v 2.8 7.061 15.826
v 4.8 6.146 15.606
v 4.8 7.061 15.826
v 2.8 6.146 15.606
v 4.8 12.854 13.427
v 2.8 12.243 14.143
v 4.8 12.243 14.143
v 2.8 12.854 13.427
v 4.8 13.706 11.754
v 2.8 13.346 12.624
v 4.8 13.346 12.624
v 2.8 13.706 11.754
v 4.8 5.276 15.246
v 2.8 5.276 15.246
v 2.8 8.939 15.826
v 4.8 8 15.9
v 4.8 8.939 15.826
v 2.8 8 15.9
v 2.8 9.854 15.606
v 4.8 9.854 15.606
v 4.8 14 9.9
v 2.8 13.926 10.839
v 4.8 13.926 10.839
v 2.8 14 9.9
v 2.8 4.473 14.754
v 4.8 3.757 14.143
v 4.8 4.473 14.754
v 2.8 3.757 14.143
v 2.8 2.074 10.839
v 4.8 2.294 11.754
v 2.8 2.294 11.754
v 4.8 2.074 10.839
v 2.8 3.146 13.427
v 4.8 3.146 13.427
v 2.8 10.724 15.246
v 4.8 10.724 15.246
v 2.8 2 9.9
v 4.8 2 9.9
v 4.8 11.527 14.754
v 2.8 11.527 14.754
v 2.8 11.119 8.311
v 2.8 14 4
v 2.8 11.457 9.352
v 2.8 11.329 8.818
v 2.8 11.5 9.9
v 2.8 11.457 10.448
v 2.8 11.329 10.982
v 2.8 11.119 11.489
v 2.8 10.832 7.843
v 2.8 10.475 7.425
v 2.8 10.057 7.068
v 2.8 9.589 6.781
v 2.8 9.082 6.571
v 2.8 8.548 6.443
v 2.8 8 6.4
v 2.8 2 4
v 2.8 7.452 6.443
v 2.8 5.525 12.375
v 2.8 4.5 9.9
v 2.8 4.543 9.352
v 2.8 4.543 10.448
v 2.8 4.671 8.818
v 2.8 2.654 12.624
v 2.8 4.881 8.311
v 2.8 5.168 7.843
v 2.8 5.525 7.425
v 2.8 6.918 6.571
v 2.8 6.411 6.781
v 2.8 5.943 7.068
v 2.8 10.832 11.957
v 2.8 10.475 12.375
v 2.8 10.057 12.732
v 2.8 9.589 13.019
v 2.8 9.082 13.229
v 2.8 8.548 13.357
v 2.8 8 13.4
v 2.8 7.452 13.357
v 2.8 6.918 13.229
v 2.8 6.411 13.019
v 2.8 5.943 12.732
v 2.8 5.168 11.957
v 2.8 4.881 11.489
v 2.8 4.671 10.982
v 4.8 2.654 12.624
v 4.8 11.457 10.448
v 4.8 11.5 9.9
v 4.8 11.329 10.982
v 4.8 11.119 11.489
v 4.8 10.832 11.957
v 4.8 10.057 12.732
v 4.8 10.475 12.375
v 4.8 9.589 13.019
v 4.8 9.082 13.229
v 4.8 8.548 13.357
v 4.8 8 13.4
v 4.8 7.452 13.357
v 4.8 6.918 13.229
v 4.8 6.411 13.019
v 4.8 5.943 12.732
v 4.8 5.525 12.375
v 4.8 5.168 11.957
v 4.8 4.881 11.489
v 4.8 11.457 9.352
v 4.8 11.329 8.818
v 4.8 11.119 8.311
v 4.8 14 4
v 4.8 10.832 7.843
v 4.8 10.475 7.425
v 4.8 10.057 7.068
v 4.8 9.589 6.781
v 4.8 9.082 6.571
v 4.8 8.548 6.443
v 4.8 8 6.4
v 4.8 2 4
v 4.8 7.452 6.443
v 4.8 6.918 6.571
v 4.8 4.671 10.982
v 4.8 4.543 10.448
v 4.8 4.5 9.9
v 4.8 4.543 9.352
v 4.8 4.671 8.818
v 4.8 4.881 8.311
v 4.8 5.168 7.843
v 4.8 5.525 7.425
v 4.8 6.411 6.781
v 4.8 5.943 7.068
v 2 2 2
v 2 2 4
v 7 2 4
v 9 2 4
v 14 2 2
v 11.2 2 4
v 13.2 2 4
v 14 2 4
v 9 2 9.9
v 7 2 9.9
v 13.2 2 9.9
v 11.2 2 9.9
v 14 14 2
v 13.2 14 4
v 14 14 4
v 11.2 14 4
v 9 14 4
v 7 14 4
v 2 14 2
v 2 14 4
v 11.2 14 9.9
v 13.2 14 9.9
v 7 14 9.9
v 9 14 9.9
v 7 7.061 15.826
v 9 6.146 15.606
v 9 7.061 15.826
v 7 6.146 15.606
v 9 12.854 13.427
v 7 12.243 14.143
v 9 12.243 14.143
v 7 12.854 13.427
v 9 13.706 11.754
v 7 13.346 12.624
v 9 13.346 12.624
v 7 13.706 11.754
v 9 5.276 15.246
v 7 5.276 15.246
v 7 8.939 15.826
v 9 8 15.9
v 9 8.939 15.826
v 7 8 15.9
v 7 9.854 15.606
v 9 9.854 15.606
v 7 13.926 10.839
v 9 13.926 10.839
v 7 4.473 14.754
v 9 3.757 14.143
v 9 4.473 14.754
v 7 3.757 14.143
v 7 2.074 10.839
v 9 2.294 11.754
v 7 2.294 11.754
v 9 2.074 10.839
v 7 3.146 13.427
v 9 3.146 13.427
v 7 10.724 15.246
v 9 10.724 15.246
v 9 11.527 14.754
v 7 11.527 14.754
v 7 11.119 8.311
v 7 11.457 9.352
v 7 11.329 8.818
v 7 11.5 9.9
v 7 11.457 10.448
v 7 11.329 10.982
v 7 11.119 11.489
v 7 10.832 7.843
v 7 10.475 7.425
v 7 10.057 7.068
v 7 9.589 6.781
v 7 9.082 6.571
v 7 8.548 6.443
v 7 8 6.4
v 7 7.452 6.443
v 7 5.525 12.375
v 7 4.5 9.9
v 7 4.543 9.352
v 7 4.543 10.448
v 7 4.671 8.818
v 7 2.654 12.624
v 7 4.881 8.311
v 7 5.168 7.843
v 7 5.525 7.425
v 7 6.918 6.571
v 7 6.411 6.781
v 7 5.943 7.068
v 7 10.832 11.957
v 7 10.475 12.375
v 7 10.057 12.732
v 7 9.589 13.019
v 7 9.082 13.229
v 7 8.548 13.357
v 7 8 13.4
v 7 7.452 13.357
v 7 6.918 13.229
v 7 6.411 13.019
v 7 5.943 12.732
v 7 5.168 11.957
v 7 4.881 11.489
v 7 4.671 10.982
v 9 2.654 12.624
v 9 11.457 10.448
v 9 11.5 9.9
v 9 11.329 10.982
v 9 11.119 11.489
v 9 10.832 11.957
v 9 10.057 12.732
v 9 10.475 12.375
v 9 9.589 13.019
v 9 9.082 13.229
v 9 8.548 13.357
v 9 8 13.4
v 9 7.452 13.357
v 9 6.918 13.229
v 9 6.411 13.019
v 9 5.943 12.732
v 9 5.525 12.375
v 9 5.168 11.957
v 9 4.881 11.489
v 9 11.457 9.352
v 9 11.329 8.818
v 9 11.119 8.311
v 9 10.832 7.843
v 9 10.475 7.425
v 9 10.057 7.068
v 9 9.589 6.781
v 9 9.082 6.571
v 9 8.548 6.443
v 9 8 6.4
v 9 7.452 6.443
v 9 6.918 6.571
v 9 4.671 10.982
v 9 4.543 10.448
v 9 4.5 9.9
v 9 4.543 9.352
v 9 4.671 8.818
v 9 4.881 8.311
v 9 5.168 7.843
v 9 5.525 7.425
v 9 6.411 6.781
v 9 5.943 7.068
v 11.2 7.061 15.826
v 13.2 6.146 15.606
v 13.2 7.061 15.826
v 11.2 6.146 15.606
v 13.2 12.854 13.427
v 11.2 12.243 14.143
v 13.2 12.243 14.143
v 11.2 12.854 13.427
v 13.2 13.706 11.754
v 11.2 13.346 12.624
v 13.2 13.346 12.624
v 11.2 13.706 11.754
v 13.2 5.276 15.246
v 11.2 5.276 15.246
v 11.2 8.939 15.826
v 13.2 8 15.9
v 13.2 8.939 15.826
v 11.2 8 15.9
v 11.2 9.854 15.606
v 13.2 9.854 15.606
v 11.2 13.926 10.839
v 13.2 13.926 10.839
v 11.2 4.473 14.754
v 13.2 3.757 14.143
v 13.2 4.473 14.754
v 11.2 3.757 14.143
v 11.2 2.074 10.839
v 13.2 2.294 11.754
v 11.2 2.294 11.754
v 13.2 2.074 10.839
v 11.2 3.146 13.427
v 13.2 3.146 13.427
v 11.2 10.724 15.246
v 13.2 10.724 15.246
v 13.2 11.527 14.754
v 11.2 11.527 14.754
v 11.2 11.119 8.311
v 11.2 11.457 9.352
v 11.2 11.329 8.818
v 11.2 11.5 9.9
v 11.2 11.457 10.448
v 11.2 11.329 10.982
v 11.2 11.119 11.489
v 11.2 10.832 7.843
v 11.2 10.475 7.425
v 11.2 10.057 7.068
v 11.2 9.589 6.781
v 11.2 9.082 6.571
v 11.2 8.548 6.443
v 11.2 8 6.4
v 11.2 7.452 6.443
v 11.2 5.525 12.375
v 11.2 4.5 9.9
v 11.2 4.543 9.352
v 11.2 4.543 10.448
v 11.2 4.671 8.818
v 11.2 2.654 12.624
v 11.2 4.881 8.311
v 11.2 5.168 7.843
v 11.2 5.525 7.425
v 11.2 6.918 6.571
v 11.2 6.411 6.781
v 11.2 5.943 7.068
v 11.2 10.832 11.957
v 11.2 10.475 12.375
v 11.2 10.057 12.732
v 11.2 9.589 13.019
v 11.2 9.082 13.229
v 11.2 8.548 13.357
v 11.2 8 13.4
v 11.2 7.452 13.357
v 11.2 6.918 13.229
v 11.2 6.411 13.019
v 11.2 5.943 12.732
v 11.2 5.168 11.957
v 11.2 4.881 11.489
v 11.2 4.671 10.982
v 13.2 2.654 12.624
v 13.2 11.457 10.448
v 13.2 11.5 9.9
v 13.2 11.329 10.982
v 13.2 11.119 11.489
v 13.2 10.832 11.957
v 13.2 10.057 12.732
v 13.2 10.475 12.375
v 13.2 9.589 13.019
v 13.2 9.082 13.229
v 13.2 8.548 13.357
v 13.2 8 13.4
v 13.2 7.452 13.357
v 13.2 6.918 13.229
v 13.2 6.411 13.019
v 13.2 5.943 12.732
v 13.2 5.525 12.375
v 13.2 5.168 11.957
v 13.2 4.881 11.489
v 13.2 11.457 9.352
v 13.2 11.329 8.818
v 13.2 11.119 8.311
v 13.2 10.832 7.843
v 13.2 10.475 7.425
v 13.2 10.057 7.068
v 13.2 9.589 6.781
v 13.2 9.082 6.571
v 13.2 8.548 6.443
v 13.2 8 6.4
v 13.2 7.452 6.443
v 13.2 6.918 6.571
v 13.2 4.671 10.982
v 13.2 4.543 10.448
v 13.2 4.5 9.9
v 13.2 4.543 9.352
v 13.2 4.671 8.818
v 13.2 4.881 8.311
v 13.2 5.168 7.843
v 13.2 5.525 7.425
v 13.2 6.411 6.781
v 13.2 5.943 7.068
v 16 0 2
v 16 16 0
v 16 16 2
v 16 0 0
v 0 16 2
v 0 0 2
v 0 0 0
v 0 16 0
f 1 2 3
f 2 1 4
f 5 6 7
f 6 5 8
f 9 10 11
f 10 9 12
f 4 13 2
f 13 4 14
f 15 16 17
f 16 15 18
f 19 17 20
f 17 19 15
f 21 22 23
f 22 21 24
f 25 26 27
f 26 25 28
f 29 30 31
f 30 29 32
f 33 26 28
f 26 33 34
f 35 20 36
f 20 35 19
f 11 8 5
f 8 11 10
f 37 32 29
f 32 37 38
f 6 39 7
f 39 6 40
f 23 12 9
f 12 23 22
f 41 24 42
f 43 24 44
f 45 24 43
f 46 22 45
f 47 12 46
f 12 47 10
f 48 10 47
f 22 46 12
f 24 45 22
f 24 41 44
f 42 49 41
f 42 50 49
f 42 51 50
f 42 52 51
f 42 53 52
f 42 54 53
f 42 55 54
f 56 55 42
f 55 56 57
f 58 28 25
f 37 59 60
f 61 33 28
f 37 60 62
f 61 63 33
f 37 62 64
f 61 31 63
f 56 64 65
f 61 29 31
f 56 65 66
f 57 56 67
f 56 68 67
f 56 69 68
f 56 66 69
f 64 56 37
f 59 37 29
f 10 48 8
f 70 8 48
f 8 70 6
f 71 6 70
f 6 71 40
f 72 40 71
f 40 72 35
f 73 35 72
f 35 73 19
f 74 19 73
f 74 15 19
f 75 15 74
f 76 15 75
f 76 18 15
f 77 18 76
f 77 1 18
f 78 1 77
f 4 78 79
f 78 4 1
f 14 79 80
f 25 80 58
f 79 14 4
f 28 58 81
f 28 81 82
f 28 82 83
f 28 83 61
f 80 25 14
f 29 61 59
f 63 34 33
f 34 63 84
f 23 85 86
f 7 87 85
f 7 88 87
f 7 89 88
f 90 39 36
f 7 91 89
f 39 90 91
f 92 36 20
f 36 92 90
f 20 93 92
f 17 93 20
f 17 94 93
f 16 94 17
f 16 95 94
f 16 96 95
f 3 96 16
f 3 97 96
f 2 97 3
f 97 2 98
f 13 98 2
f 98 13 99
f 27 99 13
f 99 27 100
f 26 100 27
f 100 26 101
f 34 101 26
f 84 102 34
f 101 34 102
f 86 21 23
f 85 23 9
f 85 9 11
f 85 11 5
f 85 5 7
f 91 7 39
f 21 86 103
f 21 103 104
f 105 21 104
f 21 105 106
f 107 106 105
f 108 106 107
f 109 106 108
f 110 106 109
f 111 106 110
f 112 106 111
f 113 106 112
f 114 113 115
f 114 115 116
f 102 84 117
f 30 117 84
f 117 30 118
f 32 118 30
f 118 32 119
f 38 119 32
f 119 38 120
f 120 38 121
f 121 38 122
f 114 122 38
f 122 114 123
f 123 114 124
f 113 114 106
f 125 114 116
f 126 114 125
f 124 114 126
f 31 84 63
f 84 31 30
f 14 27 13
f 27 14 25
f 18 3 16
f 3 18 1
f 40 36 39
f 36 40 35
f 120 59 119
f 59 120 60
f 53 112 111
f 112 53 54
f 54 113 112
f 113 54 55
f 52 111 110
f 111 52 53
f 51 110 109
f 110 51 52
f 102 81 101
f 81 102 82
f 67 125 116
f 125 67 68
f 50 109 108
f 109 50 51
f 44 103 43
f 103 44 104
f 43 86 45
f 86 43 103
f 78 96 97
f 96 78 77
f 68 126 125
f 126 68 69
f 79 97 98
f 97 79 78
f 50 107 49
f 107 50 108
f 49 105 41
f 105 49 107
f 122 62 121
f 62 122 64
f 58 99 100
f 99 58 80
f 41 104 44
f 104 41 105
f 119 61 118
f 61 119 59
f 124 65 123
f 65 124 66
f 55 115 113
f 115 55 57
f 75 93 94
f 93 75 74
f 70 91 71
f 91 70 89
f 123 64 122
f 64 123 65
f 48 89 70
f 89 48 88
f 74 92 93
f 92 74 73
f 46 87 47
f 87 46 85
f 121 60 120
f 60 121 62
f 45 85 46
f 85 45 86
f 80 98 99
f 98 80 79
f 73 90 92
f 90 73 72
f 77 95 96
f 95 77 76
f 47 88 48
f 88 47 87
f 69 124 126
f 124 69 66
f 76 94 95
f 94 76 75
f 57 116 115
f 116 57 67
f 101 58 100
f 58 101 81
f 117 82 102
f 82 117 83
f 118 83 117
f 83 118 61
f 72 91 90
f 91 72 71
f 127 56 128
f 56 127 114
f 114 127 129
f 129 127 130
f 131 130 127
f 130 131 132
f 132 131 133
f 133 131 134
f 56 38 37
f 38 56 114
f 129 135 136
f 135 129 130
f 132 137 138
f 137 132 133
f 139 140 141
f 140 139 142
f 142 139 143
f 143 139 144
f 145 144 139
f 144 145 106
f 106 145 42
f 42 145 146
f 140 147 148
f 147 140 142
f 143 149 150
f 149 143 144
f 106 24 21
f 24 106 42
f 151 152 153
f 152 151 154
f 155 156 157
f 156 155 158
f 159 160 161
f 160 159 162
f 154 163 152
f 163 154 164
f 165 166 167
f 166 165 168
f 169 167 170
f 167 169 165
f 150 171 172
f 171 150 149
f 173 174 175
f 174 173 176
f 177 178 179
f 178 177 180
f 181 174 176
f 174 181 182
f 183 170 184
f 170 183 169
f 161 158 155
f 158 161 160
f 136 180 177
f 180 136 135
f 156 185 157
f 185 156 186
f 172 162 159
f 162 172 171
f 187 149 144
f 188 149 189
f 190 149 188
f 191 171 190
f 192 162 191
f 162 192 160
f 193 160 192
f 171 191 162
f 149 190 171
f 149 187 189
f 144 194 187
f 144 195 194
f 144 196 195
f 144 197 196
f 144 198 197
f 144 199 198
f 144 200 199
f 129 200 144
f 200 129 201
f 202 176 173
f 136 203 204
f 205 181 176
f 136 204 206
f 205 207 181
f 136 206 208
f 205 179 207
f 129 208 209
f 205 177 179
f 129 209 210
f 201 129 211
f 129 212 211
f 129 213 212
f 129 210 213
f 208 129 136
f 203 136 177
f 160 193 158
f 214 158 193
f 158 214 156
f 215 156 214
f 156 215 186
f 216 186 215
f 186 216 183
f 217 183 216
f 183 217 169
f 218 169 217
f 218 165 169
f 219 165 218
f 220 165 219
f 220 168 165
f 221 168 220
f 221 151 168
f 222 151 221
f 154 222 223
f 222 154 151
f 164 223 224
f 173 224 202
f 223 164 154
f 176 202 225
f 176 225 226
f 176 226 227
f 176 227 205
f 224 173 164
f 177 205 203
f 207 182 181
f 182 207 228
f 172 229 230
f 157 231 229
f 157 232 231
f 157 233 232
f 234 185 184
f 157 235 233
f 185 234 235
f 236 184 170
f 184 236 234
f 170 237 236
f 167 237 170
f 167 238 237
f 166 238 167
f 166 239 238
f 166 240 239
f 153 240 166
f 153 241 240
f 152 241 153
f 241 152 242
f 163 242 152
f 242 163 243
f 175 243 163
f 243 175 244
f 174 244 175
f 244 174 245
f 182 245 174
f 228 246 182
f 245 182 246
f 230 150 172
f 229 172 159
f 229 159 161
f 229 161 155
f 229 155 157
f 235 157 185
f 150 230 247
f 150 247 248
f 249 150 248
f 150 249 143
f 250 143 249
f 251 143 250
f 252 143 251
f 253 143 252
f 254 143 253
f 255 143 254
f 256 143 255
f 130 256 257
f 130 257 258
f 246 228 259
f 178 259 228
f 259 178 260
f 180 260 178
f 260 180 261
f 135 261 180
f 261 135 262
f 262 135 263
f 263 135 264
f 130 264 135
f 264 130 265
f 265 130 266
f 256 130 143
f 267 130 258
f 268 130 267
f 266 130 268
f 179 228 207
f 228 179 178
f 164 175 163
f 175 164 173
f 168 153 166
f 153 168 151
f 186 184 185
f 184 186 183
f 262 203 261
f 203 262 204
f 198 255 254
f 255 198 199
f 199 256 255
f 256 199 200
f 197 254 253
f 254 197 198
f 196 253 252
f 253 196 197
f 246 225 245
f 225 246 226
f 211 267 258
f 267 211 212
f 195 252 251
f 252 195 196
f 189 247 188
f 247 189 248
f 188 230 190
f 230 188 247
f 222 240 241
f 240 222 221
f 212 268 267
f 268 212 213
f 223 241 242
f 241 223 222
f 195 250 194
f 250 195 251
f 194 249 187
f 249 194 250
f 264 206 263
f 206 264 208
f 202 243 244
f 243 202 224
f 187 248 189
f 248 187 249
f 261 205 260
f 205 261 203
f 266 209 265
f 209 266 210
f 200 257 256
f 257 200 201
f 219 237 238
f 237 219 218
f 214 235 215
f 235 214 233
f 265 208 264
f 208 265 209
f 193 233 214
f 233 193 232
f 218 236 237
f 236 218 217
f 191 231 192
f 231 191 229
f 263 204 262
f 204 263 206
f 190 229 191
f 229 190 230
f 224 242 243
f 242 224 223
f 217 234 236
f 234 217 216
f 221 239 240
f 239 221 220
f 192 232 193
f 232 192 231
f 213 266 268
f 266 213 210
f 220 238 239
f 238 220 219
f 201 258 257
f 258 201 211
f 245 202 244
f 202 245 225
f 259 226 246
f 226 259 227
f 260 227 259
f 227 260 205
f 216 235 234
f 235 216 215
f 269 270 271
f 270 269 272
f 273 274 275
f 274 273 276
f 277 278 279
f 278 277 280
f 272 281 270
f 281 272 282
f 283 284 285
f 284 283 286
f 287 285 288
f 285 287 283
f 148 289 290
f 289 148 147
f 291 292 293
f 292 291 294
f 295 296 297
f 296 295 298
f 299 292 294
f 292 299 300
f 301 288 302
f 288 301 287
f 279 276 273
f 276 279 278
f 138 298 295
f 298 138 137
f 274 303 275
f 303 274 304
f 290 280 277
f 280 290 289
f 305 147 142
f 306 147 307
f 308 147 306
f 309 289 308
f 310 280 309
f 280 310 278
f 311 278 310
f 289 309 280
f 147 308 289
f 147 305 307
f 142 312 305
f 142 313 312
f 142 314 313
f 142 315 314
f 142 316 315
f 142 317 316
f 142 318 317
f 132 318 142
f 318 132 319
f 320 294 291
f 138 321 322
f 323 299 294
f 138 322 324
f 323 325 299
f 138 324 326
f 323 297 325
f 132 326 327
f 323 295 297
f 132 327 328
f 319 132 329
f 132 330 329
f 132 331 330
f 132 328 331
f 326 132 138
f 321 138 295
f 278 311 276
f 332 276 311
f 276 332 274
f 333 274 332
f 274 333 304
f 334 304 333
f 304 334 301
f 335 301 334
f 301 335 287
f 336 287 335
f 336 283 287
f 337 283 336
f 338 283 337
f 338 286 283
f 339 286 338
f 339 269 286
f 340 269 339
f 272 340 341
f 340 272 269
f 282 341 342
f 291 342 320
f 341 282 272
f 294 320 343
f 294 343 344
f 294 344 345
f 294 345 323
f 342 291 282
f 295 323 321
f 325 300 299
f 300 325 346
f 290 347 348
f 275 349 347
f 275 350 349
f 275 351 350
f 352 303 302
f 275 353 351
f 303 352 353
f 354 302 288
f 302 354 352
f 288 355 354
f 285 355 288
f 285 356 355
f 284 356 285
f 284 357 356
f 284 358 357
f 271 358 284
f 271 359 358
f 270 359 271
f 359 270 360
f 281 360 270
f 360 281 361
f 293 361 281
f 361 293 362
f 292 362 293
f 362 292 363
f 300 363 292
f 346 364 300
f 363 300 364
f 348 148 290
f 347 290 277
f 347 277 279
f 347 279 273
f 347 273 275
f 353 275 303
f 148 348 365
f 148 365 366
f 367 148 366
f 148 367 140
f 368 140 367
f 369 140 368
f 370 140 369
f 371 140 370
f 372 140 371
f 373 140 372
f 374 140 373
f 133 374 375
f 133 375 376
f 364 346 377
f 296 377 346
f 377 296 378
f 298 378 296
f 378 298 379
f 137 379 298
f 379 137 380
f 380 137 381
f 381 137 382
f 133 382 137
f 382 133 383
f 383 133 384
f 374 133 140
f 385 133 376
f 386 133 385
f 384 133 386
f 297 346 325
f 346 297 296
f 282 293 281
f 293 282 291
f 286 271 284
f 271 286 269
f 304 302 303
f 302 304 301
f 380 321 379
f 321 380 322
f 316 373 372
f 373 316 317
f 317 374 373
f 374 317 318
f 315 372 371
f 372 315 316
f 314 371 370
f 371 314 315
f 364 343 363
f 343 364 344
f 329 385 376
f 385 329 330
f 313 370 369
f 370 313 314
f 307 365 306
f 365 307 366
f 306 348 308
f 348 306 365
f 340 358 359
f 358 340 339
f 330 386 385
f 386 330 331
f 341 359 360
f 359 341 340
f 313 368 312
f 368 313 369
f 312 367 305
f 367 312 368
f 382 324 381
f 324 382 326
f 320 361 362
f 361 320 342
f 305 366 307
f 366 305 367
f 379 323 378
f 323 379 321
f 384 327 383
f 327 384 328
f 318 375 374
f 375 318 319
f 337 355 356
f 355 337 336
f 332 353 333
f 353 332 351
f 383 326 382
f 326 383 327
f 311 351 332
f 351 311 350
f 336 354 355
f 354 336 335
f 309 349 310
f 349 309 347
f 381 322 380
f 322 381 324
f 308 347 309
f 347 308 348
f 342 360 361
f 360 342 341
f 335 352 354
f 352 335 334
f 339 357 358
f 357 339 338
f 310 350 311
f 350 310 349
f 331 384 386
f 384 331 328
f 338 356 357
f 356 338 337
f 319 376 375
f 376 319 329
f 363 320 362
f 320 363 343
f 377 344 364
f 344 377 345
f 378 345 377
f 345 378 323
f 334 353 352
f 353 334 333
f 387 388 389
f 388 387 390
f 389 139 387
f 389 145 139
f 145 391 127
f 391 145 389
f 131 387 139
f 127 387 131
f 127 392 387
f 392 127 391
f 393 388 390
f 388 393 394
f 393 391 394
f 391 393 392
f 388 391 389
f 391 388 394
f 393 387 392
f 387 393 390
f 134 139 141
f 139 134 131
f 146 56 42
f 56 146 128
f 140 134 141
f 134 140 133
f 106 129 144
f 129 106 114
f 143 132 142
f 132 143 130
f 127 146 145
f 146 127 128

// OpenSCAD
// RPi Camera Mount Base
//

$fn = 40;
translate([0,0,0]){
    cube([16,16,2]);
}
module pin_arm(){
    translate([0,-6,0]){
        cube([6,2,2]);
    }
    translate([0,4,0]){
        cube([6,2,2]);
    }
    translate([4,-6,0]){
        cube([2,10,2]);
    }
    difference(){
        translate([0,0,0]){
            rotate([0,0,0]){
                cylinder(h=2,d=12);
            }
        }
        translate([0,0,-0.5]){
            rotate([0,0,0]){
                cylinder(h=3,d=7);
            }
        }
    }   
}
translate([2.8,8,9.9]){
    rotate([0,90,0]){
        pin_arm(); //left 0.2mm extra
    }
}
translate([7,8,9.9]){
    rotate([0,90,0]){
        pin_arm(); //middle
    }
}
translate([11.2,8,9.9]){
    rotate([0,90,0]){
        pin_arm(); //right 0.2 mm extra
    }
}
translate([2,2,2]){
    cube([12,12,2]);
}
